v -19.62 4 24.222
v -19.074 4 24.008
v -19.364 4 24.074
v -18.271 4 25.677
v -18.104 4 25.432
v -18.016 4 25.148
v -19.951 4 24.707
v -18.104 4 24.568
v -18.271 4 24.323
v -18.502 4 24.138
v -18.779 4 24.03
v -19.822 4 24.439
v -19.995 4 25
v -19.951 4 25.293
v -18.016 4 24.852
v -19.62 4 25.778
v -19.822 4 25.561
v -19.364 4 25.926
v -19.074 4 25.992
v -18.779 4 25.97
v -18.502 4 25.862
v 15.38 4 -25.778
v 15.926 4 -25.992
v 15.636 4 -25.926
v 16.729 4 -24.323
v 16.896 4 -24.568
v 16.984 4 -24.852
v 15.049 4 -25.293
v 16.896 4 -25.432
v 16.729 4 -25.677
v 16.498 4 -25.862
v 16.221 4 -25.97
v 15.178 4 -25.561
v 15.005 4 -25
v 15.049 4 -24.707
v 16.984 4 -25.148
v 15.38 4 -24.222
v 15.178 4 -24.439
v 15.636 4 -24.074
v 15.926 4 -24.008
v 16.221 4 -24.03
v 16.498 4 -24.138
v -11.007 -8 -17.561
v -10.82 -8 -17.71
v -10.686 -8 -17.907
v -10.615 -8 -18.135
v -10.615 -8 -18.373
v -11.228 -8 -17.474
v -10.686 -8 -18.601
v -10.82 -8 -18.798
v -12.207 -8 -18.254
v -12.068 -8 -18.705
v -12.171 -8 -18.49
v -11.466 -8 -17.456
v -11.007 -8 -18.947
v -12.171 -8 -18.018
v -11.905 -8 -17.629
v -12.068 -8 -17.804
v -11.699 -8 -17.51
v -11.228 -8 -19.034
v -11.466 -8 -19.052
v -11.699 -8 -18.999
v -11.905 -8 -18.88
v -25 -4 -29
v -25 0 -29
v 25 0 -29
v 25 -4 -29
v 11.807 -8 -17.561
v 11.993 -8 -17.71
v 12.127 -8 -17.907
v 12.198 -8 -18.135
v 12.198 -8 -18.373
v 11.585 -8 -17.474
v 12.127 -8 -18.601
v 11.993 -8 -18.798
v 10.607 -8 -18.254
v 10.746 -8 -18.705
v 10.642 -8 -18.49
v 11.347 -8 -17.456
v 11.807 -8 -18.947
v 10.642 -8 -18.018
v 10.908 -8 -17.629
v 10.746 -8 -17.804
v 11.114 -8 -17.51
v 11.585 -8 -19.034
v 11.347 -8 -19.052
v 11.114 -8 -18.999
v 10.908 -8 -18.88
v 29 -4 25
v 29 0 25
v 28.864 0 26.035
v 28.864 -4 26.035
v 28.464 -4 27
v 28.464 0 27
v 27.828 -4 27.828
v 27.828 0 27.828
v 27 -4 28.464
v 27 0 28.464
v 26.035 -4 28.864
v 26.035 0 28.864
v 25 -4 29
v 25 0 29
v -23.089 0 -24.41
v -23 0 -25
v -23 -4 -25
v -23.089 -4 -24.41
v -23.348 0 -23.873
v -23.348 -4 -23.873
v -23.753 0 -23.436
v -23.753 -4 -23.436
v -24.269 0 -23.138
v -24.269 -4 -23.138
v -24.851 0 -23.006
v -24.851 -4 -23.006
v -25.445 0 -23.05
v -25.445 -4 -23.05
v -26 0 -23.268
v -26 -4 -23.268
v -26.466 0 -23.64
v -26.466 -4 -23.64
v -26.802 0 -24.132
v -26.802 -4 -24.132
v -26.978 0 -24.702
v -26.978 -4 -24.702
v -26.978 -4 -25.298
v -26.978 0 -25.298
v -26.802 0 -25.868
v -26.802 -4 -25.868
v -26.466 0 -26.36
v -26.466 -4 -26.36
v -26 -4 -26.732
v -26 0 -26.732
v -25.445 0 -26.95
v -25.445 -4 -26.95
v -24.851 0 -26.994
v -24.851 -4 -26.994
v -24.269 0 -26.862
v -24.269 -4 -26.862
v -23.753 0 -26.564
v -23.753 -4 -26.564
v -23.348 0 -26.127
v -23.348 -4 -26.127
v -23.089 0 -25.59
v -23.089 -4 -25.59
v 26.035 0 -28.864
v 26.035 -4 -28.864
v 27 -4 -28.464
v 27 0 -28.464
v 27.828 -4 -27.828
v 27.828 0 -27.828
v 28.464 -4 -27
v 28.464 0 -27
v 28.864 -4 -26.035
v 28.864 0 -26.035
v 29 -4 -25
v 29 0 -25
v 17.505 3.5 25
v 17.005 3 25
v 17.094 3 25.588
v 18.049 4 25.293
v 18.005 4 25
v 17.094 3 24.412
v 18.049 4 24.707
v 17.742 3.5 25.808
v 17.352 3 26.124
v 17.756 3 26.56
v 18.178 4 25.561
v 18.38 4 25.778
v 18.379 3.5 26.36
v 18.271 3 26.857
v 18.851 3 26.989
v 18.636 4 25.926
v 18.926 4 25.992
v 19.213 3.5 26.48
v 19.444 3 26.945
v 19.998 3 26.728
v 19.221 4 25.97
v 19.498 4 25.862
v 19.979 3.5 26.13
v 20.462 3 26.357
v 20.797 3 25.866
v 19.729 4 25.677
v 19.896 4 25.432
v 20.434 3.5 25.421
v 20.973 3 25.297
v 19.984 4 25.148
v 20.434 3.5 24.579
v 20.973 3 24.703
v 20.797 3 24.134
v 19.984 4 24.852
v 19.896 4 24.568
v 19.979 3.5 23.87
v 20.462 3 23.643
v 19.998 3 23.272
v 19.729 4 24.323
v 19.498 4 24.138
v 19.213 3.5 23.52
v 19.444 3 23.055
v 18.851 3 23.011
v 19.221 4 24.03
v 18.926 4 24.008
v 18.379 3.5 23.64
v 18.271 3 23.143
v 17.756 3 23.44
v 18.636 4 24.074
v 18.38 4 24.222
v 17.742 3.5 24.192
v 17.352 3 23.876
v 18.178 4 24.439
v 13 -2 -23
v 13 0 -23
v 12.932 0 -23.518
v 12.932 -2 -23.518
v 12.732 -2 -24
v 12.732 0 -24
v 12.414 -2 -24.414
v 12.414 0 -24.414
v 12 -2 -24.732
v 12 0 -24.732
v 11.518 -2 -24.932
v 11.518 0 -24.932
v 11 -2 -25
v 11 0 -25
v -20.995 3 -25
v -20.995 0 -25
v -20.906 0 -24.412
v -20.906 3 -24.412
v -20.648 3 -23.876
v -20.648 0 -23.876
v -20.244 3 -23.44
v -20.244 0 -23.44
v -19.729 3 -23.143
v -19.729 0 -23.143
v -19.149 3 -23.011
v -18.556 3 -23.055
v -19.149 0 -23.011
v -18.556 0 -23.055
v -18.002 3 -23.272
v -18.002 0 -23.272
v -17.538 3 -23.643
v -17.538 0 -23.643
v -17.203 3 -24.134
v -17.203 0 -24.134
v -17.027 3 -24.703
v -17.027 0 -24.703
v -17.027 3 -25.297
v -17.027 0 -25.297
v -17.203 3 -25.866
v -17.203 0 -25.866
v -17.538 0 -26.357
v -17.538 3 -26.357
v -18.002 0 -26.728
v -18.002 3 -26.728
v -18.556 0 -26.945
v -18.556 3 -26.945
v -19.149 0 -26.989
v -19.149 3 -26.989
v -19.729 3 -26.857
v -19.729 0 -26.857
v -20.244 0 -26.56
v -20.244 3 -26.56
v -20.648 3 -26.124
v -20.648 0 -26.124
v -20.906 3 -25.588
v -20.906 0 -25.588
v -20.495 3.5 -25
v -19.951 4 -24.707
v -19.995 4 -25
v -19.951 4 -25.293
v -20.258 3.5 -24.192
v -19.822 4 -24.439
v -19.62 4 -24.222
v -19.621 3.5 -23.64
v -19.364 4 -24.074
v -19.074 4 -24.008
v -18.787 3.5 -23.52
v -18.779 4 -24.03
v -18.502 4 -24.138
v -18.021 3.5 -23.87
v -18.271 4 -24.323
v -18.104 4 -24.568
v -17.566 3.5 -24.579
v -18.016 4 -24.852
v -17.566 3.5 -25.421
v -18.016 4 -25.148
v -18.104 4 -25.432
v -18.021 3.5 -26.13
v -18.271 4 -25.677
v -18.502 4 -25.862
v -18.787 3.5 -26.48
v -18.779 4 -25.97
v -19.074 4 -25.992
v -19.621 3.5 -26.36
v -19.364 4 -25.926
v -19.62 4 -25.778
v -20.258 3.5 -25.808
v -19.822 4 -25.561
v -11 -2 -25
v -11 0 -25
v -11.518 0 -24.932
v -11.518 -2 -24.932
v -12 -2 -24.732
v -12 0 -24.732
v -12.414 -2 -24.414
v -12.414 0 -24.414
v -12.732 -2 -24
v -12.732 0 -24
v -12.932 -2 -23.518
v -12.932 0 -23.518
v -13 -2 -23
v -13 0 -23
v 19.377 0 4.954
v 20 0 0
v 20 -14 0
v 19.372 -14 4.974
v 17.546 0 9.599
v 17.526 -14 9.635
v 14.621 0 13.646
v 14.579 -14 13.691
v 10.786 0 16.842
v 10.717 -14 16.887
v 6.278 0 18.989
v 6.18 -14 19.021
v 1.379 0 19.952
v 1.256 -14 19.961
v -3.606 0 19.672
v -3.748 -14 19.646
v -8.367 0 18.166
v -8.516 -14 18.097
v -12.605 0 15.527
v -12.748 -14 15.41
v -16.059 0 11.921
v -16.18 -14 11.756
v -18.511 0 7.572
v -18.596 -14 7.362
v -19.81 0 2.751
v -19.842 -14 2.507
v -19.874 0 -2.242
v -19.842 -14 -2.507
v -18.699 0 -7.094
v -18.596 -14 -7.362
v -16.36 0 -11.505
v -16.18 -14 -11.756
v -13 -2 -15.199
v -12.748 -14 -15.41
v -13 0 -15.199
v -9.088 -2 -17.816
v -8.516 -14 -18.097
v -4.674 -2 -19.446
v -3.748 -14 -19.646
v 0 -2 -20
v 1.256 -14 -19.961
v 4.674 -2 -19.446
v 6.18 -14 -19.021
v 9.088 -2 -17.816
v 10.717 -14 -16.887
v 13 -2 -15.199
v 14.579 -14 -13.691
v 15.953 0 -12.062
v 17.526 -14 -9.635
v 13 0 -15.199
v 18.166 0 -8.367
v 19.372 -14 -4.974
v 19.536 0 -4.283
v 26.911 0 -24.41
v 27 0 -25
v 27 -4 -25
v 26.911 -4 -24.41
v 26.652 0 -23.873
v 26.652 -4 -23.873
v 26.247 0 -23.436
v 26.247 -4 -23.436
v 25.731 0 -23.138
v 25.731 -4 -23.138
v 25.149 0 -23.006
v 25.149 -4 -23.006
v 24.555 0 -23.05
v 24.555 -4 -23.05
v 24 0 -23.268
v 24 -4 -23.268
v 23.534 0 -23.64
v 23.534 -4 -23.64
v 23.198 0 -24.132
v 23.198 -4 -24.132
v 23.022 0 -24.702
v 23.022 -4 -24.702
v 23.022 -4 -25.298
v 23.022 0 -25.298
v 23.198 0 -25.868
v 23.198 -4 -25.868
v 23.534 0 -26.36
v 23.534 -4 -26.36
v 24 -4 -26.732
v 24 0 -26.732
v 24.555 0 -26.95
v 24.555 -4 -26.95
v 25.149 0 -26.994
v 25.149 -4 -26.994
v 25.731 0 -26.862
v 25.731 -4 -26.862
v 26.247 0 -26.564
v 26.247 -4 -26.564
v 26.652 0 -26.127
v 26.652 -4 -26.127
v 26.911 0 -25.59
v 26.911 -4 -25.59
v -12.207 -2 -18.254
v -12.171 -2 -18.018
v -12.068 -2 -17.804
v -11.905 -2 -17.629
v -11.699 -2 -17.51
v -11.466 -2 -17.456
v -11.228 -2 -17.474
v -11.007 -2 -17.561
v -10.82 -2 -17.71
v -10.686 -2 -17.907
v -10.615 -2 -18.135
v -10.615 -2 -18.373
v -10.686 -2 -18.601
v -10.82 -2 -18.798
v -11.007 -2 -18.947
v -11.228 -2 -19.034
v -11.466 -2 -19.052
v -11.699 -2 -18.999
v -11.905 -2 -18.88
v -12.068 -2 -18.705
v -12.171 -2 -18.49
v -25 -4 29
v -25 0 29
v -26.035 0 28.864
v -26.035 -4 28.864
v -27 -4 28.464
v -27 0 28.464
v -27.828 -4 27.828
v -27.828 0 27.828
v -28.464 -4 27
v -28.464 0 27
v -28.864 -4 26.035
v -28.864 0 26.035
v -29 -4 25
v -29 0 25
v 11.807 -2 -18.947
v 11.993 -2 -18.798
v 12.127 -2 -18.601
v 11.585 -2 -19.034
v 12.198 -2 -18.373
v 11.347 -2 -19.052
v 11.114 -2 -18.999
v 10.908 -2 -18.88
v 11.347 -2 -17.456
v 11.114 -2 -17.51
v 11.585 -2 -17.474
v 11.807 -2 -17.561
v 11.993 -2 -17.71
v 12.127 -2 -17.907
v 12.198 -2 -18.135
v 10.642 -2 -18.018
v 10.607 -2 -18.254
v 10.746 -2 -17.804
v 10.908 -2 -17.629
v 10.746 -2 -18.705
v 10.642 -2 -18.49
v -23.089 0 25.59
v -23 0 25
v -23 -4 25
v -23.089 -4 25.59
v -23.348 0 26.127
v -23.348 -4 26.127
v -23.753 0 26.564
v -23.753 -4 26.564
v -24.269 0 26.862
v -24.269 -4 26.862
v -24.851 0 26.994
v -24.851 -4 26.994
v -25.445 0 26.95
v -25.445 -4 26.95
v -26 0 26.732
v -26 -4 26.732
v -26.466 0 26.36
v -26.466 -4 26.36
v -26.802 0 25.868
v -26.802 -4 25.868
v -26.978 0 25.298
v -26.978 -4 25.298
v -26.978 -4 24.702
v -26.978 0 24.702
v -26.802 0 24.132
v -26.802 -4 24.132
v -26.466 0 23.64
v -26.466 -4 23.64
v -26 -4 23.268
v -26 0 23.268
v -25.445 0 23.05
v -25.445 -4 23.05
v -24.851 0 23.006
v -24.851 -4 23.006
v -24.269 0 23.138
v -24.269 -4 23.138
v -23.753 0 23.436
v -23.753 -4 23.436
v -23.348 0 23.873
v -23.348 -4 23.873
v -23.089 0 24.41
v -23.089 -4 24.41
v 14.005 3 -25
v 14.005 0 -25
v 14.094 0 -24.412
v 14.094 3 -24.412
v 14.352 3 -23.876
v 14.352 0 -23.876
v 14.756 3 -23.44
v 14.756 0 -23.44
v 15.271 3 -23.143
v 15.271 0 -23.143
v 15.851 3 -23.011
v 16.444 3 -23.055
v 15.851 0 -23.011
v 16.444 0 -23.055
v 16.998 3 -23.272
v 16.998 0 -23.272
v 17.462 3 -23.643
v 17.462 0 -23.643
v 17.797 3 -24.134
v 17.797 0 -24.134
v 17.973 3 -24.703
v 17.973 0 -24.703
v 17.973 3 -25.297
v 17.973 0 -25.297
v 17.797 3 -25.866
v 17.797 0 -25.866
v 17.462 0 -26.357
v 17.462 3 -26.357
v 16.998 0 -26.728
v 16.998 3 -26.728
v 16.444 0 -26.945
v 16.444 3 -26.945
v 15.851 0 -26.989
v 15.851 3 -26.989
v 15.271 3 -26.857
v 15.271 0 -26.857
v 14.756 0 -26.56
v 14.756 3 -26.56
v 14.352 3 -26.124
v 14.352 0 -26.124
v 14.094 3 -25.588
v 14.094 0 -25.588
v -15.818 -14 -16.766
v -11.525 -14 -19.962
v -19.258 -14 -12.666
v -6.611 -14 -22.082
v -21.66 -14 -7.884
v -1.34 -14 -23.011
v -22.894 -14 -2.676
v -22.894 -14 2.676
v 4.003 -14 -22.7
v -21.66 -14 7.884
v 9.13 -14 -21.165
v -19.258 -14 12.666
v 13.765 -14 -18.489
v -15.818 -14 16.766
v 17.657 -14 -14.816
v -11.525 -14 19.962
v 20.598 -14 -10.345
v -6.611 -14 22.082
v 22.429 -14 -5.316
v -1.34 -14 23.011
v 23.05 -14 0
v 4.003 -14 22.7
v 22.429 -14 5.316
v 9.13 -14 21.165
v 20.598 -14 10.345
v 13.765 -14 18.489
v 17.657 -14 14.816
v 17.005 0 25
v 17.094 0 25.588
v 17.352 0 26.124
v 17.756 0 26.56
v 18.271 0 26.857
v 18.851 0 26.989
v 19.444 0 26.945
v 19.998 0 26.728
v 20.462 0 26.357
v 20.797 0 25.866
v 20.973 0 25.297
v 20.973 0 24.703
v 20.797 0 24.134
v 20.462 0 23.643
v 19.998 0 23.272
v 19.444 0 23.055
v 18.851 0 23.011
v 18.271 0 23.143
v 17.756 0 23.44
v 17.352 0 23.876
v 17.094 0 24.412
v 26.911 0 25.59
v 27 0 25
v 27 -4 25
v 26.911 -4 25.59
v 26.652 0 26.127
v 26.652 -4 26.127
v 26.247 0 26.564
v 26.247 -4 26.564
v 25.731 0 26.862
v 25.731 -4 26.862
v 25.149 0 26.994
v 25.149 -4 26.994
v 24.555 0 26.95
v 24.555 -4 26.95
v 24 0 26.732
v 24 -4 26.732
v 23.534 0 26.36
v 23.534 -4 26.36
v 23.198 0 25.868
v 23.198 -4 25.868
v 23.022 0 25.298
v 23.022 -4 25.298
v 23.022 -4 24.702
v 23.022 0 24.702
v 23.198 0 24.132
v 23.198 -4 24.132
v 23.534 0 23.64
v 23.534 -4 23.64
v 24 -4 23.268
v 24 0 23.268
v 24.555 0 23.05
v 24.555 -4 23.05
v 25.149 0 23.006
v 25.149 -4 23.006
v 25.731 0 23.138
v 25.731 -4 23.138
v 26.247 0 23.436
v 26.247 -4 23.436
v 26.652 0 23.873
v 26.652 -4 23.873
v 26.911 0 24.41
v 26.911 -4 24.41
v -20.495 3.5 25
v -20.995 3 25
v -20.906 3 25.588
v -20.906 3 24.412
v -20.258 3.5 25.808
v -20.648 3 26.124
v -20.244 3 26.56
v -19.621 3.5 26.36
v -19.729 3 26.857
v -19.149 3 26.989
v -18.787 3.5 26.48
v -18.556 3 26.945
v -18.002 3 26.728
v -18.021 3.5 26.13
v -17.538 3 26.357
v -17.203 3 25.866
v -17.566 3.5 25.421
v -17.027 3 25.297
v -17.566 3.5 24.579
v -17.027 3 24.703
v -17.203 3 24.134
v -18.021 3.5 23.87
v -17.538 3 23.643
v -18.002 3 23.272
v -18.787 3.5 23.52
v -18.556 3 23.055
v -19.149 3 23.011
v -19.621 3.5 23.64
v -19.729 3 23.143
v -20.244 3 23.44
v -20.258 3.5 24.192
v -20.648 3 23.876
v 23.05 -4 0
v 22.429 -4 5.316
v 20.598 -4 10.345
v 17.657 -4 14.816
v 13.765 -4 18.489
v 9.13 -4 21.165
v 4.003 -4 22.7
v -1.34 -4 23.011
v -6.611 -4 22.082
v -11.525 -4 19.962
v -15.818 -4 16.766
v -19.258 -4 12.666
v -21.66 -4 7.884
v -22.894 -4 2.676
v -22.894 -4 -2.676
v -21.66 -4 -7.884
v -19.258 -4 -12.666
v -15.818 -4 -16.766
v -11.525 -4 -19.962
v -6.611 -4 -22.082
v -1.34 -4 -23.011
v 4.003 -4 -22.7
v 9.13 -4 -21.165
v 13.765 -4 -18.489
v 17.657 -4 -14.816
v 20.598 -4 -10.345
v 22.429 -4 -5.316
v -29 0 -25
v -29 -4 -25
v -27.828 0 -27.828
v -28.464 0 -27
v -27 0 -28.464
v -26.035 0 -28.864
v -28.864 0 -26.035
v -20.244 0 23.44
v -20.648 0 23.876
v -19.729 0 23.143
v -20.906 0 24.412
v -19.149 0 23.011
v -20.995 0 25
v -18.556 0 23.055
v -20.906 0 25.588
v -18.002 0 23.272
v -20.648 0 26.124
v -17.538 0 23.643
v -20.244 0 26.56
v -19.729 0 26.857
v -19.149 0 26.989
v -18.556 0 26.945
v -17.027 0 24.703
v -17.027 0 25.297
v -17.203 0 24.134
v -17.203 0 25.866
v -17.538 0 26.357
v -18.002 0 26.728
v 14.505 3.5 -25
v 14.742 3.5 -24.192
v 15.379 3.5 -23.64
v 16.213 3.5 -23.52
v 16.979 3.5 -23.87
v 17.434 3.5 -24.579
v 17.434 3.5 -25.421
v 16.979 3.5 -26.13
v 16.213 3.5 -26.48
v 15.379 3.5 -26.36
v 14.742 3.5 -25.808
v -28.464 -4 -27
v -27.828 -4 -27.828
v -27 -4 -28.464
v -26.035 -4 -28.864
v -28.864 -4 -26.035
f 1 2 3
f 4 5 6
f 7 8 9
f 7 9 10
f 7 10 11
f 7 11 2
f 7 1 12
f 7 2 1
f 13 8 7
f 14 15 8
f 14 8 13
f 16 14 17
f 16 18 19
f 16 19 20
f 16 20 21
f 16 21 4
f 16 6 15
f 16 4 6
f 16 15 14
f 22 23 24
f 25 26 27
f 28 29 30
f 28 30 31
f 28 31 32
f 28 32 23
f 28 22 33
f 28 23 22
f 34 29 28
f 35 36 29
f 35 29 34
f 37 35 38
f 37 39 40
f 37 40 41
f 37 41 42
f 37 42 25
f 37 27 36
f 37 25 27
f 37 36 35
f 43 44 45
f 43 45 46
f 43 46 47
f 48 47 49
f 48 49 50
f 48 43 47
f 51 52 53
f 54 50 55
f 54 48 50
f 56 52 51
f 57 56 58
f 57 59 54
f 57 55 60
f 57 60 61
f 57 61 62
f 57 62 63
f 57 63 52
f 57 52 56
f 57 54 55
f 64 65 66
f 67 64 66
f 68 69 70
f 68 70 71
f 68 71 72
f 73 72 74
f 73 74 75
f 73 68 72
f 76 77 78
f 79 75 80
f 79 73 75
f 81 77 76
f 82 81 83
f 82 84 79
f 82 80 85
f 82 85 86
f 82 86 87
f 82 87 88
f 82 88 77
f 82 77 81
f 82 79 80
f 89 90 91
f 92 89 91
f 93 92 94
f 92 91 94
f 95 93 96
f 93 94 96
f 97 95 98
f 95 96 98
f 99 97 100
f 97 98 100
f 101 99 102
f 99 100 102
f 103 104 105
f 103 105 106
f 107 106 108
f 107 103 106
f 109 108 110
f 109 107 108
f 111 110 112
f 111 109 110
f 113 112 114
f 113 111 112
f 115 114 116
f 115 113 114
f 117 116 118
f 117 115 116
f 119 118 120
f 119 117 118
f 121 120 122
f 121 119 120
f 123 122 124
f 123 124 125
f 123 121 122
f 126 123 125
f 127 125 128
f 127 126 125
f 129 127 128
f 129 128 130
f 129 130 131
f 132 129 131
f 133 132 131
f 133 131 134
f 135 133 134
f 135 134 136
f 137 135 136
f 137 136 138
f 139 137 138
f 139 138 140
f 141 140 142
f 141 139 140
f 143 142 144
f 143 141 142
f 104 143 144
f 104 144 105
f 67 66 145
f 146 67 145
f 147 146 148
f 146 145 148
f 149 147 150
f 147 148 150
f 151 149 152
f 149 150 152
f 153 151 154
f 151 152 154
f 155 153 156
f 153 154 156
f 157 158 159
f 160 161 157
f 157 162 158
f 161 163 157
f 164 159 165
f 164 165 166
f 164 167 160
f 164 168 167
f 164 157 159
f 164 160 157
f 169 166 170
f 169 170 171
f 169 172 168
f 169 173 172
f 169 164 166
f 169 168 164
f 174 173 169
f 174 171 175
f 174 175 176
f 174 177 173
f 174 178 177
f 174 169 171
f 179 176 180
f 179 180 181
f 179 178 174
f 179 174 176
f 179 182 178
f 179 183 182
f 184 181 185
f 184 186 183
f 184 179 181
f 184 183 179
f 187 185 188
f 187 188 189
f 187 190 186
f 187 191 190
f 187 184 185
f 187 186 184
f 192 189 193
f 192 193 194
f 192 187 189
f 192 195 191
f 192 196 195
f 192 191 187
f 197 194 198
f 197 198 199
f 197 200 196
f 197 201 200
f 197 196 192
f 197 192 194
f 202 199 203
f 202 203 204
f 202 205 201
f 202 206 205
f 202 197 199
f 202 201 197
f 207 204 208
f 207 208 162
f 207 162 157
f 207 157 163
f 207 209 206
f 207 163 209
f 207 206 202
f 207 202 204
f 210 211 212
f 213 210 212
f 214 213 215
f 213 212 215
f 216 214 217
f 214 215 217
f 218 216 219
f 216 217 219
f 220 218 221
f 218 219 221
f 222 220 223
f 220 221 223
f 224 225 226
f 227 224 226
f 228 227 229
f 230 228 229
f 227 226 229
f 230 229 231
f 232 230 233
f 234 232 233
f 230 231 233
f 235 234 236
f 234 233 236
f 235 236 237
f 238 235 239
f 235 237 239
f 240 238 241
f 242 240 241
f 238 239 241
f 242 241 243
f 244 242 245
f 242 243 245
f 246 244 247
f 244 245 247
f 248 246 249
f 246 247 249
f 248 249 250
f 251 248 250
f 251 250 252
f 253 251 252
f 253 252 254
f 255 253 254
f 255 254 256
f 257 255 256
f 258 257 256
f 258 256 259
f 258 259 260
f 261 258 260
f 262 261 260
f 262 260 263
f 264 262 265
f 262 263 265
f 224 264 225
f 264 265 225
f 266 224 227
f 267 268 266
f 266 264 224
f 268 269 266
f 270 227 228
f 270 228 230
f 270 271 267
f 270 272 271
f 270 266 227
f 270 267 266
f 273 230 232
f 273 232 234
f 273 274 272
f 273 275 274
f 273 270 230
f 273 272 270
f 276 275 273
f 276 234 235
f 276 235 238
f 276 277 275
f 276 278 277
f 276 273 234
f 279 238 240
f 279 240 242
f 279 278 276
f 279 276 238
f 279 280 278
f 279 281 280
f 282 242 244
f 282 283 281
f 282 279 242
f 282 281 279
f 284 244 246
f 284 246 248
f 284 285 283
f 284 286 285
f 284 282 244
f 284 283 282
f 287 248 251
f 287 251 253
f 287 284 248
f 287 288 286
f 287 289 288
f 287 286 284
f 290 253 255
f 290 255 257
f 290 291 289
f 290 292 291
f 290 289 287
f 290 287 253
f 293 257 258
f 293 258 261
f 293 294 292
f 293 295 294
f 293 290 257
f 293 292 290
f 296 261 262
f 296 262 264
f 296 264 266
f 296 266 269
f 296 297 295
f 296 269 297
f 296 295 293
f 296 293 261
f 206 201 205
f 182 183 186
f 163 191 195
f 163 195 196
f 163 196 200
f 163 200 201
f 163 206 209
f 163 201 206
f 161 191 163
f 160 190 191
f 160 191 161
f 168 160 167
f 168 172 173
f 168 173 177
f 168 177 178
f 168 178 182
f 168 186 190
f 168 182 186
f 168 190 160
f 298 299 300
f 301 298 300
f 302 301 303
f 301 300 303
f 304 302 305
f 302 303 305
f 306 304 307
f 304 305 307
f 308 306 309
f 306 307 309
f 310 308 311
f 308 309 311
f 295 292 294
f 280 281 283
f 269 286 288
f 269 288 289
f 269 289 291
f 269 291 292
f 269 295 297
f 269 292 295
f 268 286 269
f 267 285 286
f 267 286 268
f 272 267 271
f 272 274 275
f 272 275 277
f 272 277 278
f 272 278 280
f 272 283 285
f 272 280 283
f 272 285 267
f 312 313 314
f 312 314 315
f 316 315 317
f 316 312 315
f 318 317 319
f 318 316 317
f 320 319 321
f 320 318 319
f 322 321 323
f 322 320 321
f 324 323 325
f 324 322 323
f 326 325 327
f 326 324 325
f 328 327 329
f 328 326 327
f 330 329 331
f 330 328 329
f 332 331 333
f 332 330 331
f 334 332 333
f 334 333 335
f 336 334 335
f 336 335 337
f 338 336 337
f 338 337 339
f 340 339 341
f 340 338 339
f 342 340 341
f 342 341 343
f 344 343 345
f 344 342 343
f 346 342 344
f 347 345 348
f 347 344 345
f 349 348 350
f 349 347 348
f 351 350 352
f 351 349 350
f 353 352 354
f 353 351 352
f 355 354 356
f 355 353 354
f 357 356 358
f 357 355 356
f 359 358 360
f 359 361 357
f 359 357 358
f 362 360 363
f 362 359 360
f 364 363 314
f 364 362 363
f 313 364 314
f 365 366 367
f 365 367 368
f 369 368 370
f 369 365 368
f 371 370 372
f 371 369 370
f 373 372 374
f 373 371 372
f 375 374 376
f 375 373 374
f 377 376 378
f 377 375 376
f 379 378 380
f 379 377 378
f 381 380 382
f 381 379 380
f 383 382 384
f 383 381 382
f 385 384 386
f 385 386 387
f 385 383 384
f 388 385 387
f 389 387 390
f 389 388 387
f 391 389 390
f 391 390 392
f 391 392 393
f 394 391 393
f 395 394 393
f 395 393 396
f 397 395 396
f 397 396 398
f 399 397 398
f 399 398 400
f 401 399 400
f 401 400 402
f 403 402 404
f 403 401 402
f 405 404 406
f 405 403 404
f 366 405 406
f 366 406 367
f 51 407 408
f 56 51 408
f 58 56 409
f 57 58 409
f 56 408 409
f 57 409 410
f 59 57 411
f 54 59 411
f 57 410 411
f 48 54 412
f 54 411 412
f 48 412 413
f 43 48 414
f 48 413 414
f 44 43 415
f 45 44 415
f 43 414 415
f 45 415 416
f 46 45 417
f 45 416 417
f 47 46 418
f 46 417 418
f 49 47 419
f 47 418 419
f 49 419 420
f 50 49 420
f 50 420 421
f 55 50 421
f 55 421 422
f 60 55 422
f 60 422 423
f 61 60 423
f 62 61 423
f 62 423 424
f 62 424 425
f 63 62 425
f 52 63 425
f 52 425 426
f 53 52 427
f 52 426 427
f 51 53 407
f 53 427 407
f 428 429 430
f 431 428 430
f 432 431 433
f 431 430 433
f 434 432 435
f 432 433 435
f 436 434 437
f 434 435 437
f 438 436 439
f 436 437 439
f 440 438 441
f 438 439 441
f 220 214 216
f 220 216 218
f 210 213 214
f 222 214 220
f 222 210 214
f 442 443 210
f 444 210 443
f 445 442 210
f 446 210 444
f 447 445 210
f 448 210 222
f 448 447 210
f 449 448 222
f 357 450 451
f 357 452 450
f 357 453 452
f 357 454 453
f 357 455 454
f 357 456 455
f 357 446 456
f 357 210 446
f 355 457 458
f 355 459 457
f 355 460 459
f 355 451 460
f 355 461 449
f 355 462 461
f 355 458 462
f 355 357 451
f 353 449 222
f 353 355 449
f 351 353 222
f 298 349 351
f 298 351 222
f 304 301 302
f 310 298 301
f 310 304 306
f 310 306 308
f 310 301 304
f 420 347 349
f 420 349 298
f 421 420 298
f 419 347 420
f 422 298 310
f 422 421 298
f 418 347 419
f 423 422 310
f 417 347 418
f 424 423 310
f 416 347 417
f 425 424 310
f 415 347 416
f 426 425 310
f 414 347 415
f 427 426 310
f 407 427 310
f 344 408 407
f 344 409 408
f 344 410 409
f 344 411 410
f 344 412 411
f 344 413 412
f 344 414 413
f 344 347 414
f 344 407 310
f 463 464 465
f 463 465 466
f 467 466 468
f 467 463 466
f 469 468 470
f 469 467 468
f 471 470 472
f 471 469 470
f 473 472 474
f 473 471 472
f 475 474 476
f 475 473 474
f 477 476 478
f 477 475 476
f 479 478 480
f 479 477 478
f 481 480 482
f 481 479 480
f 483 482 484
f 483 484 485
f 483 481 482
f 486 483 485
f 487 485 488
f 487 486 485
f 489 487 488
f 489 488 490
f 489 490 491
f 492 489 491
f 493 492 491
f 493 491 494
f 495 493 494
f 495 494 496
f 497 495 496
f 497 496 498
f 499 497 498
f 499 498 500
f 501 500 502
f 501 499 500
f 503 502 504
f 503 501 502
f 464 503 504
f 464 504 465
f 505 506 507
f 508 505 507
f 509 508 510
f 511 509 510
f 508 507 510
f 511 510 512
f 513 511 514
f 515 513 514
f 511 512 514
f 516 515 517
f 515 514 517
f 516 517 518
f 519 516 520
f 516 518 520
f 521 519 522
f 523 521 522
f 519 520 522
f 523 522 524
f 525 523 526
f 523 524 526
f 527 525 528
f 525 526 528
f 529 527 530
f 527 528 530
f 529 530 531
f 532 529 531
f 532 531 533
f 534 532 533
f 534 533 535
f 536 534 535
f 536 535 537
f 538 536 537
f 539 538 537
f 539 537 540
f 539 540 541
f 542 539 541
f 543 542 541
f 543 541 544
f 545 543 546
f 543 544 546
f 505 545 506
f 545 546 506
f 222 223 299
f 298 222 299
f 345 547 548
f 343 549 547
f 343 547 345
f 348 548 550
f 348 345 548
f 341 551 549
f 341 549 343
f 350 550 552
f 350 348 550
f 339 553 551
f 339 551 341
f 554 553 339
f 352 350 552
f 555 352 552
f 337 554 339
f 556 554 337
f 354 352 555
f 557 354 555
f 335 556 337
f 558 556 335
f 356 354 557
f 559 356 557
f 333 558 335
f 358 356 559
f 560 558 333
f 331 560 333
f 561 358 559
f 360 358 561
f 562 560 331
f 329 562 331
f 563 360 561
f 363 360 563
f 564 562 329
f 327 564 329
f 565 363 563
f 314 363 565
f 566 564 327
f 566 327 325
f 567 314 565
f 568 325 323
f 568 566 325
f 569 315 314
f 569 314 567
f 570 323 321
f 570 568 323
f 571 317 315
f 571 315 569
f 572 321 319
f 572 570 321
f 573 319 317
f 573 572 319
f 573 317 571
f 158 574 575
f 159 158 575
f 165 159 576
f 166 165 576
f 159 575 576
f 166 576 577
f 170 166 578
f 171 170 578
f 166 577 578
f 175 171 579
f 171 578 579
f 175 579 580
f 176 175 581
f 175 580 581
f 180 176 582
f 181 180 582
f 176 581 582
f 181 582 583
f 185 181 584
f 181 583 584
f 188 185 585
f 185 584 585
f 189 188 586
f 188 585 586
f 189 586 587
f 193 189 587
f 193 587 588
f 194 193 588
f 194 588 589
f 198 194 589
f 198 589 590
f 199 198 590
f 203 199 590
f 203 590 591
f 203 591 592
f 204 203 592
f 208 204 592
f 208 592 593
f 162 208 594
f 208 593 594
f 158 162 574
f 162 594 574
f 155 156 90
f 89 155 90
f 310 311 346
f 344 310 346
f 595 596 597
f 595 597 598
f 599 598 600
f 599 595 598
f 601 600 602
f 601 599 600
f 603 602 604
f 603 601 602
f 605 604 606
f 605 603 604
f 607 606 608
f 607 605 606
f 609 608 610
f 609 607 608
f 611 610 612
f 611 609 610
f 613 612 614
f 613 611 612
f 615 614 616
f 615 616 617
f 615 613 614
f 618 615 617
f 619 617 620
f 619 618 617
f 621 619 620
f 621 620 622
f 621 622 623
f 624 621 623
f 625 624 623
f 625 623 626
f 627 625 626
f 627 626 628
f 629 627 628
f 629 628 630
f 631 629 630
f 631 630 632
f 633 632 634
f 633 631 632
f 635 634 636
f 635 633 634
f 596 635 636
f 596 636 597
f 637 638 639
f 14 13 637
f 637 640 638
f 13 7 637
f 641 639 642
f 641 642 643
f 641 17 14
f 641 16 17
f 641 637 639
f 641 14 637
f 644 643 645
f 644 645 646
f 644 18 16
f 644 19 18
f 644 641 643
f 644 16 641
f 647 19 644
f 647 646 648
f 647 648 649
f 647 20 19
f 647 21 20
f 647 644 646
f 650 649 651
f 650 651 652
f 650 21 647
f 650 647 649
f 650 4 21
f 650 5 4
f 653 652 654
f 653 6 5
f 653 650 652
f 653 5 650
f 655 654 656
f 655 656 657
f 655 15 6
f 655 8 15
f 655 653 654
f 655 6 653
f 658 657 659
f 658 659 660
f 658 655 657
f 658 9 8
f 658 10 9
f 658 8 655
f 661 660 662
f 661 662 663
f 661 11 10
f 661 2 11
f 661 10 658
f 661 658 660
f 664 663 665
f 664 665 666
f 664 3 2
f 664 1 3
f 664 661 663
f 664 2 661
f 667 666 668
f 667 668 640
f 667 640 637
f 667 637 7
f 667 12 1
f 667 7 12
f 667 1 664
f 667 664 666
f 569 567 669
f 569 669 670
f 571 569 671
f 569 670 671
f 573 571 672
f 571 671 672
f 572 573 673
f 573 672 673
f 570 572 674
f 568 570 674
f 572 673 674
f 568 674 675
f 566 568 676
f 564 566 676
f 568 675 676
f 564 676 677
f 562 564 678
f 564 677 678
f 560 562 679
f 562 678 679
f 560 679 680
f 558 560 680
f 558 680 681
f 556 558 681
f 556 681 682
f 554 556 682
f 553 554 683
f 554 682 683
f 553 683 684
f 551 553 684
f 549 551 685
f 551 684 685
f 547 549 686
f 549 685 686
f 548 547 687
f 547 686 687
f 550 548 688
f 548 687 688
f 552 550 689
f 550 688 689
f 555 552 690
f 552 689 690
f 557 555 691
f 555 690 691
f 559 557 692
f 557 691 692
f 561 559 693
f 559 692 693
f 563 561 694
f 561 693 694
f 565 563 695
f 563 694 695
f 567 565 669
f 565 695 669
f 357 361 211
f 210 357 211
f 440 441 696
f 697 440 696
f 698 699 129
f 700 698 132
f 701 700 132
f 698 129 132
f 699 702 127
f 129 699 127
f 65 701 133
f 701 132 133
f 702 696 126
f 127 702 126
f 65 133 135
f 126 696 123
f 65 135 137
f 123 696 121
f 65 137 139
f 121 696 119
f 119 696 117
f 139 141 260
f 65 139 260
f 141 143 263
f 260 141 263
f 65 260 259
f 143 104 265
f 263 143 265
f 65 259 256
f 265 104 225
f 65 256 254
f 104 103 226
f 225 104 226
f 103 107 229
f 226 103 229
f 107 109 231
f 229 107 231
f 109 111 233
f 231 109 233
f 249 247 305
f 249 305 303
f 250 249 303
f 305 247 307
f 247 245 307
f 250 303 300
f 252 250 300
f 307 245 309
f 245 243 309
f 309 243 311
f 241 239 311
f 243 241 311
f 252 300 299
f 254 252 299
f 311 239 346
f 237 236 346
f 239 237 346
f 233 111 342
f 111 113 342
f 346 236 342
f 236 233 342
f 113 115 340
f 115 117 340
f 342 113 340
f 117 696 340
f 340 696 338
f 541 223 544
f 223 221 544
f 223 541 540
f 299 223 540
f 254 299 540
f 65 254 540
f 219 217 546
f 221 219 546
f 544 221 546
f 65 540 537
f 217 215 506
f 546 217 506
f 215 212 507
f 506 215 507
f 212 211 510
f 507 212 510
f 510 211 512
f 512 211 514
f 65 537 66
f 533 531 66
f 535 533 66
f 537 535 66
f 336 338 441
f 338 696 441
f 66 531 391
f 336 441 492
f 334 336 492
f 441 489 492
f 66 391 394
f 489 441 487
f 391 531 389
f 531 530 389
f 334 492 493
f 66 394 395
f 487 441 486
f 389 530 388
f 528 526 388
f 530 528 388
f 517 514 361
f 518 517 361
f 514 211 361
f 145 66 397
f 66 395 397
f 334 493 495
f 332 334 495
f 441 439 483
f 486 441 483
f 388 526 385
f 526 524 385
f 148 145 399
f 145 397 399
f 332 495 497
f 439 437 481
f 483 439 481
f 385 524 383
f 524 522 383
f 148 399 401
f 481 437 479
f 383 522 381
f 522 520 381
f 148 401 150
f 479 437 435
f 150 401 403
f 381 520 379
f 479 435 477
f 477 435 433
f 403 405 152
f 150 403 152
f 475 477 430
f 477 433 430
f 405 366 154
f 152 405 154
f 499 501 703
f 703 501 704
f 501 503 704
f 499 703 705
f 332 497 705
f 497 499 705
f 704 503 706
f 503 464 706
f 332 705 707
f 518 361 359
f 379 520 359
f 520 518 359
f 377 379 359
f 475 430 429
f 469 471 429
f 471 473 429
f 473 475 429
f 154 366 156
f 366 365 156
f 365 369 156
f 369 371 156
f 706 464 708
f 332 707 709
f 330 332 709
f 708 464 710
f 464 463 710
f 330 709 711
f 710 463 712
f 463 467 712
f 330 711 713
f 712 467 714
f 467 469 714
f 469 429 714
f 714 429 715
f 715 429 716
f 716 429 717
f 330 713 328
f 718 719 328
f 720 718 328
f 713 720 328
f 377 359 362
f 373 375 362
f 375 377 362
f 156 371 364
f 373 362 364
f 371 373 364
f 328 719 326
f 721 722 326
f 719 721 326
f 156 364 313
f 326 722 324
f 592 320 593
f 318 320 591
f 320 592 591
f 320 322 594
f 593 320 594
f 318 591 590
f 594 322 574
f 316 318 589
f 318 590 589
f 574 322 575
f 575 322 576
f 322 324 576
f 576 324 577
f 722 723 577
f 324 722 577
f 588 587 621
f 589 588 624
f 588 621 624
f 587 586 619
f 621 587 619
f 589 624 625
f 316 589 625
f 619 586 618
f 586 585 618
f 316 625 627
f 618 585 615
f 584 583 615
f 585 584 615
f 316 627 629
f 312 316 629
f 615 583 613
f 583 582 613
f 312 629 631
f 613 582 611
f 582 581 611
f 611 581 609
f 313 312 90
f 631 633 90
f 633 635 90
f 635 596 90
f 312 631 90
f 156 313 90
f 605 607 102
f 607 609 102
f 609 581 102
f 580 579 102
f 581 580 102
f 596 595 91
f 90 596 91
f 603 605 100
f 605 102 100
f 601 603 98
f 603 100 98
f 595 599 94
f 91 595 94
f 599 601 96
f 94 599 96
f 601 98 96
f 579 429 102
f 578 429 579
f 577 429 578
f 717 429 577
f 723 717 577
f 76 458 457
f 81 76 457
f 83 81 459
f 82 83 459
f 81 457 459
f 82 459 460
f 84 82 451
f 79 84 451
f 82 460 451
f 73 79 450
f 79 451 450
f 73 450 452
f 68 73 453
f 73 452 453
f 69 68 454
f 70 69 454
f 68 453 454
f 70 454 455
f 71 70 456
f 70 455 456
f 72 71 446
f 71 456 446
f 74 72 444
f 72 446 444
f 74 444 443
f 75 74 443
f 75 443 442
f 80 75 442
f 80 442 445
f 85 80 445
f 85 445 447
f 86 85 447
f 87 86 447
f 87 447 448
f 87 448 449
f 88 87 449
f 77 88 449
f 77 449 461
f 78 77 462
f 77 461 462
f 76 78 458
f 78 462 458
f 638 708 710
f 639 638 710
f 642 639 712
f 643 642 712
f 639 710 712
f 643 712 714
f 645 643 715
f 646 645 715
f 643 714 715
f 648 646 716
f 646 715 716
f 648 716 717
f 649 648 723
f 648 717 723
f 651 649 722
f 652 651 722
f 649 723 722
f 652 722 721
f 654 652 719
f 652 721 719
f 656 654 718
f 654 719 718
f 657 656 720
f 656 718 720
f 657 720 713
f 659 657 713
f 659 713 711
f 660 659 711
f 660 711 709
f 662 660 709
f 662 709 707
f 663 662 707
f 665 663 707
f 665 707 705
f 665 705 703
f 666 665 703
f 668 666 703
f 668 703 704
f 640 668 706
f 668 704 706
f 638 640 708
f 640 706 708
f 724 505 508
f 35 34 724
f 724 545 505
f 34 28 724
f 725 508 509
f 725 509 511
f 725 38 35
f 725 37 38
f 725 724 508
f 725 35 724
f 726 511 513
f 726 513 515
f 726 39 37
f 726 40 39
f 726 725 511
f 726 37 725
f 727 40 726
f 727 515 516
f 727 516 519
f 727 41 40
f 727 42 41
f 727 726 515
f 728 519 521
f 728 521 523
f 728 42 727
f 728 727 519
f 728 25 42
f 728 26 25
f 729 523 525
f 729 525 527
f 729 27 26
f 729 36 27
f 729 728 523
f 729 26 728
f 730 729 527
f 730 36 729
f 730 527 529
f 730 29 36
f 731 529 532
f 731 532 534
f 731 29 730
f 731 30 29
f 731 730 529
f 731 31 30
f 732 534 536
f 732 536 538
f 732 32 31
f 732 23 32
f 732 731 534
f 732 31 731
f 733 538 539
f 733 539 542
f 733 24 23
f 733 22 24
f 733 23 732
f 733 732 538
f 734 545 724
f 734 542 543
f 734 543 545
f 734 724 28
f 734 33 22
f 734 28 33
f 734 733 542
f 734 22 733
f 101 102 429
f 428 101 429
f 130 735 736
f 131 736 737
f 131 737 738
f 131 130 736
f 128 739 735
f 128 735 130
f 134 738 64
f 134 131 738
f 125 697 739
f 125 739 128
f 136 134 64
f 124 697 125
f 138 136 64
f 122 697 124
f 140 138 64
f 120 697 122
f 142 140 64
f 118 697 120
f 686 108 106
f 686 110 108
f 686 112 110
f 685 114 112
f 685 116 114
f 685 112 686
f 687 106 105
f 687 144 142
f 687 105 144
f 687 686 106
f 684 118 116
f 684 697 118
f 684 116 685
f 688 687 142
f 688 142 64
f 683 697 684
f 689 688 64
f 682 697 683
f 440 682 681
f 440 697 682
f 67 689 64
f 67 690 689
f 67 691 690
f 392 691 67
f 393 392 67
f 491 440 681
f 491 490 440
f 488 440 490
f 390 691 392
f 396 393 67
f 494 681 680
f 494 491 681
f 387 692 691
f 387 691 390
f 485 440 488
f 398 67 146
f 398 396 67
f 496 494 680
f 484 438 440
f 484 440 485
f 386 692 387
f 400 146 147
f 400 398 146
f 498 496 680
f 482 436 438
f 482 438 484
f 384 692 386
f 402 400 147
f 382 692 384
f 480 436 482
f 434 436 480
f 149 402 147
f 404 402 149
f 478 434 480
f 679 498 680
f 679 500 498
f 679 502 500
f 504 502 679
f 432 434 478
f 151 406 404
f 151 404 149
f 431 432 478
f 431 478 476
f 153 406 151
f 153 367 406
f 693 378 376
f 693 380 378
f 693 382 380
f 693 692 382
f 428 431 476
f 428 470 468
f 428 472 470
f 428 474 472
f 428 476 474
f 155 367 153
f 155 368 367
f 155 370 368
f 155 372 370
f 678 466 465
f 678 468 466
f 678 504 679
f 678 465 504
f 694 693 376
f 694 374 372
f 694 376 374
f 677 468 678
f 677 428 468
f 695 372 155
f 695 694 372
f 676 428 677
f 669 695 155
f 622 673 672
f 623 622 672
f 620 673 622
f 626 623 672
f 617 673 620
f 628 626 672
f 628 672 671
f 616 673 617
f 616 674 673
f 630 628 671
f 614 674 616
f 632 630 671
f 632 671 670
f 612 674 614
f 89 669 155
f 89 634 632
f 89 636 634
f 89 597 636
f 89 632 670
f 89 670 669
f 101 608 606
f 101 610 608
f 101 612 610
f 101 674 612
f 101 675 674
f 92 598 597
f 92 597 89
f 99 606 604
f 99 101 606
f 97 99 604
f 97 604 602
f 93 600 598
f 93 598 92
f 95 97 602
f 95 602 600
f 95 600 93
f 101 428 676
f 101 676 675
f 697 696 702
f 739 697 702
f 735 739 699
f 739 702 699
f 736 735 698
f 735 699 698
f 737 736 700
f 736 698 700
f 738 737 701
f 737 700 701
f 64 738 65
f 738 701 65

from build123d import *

# Parameters (mm, degrees)
F0_R      = 2
F0_R_2    = 20
F1_DEPTH  = 4
F2_R      = 1.995
F3_DEPTH  = 4
F4_SIZE   = 1
F5_R      = 23.05
F5_R_2    = 20
F6_DEPTH  = 10
F8_DEPTH  = 2
F9_R      = 0.8
F10_DEPTH = 6


with BuildPart() as f1:
    # F0 (on Front) → F1 (new body)
    with BuildSketch(Plane.XZ):
        with BuildLine():
            ThreePointArc((29, 25), (27.828427, 27.828427), (25, 29))
            Line((25, 29), (-25, 29))
            ThreePointArc((-25, 29), (-27.828427, 27.828427), (-29, 25))
            Line((-29, 25), (-29, -25))
            ThreePointArc((-29, -25), (-27.828427, -27.828427), (-25, -29))
            Line((-25, -29), (25, -29))
            ThreePointArc((25, -29), (27.828427, -27.828427), (29, -25))
            Line((29, -25), (29, 25))
        make_face()
        with Locations((-25, -25)):
            Circle(F0_R, mode=Mode.SUBTRACT)
        with Locations((25, -25)):
            Circle(F0_R, mode=Mode.SUBTRACT)
        with Locations((-25, 25)):
            Circle(F0_R, mode=Mode.SUBTRACT)
        Circle(F0_R_2, mode=Mode.SUBTRACT)
        with Locations((25, 25)):
            Circle(F0_R, mode=Mode.SUBTRACT)
    extrude(amount=F1_DEPTH)

    # F2 (on face) → F3 (join)
    with BuildSketch(Plane(origin=(0, 0, 0), x_dir=(-1, 0, 0), z_dir=(0, 1, 0))):
        with Locations((-19, 25)):
            Circle(F2_R)
        with Locations((19, 25)):
            Circle(F2_R)
        with Locations((19, -25)):
            Circle(F2_R)
        with Locations((-16, -25)):
            Circle(F2_R)
    extrude(amount=F3_DEPTH)

    # F4
    f4_edges = [f1.edges().sort_by_distance(p)[0] for p in [
        (17.995, 4, -25),
        (-17.005, 4, -25),
        (-17.005, 4, 25),
        (20.995, 4, 25),
    ]]
    chamfer(f4_edges, length=F4_SIZE)

    # F5 (on face) → F6 (join)
    with BuildSketch(Plane.XZ.offset(4)):
        Circle(F5_R)
        Circle(F5_R_2, mode=Mode.SUBTRACT)
    extrude(amount=F6_DEPTH)

    # F7 (on face) → F8 (cut)
    with BuildSketch(Plane(origin=(0, 0, 0), x_dir=(-1, 0, 0), z_dir=(0, 1, 0))):
        with BuildLine():
            ThreePointArc((13, -15.198684), (0, -20), (-13, -15.198684))
            Line((-13, -15.198684), (-13, -23))
            ThreePointArc((-13, -23), (-12.414214, -24.414214), (-11, -25))
            Line((-11, -25), (11, -25))
            ThreePointArc((11, -25), (12.414214, -24.414214), (13, -23))
            Line((13, -23), (13, -15.198684))
        make_face()
    extrude(amount=-F8_DEPTH, mode=Mode.SUBTRACT)

    # F9 (on face) → F10 (cut)
    with BuildSketch(Plane(origin=(0, -2, 0), x_dir=(-1, 0, 0), z_dir=(0, 1, 0))):
        with Locations((-11.406512, -18.254235)):
            Circle(F9_R)
        with Locations((11.406512, -18.254235)):
            Circle(F9_R)
    extrude(amount=-F10_DEPTH, mode=Mode.SUBTRACT)


solid = f1.part
